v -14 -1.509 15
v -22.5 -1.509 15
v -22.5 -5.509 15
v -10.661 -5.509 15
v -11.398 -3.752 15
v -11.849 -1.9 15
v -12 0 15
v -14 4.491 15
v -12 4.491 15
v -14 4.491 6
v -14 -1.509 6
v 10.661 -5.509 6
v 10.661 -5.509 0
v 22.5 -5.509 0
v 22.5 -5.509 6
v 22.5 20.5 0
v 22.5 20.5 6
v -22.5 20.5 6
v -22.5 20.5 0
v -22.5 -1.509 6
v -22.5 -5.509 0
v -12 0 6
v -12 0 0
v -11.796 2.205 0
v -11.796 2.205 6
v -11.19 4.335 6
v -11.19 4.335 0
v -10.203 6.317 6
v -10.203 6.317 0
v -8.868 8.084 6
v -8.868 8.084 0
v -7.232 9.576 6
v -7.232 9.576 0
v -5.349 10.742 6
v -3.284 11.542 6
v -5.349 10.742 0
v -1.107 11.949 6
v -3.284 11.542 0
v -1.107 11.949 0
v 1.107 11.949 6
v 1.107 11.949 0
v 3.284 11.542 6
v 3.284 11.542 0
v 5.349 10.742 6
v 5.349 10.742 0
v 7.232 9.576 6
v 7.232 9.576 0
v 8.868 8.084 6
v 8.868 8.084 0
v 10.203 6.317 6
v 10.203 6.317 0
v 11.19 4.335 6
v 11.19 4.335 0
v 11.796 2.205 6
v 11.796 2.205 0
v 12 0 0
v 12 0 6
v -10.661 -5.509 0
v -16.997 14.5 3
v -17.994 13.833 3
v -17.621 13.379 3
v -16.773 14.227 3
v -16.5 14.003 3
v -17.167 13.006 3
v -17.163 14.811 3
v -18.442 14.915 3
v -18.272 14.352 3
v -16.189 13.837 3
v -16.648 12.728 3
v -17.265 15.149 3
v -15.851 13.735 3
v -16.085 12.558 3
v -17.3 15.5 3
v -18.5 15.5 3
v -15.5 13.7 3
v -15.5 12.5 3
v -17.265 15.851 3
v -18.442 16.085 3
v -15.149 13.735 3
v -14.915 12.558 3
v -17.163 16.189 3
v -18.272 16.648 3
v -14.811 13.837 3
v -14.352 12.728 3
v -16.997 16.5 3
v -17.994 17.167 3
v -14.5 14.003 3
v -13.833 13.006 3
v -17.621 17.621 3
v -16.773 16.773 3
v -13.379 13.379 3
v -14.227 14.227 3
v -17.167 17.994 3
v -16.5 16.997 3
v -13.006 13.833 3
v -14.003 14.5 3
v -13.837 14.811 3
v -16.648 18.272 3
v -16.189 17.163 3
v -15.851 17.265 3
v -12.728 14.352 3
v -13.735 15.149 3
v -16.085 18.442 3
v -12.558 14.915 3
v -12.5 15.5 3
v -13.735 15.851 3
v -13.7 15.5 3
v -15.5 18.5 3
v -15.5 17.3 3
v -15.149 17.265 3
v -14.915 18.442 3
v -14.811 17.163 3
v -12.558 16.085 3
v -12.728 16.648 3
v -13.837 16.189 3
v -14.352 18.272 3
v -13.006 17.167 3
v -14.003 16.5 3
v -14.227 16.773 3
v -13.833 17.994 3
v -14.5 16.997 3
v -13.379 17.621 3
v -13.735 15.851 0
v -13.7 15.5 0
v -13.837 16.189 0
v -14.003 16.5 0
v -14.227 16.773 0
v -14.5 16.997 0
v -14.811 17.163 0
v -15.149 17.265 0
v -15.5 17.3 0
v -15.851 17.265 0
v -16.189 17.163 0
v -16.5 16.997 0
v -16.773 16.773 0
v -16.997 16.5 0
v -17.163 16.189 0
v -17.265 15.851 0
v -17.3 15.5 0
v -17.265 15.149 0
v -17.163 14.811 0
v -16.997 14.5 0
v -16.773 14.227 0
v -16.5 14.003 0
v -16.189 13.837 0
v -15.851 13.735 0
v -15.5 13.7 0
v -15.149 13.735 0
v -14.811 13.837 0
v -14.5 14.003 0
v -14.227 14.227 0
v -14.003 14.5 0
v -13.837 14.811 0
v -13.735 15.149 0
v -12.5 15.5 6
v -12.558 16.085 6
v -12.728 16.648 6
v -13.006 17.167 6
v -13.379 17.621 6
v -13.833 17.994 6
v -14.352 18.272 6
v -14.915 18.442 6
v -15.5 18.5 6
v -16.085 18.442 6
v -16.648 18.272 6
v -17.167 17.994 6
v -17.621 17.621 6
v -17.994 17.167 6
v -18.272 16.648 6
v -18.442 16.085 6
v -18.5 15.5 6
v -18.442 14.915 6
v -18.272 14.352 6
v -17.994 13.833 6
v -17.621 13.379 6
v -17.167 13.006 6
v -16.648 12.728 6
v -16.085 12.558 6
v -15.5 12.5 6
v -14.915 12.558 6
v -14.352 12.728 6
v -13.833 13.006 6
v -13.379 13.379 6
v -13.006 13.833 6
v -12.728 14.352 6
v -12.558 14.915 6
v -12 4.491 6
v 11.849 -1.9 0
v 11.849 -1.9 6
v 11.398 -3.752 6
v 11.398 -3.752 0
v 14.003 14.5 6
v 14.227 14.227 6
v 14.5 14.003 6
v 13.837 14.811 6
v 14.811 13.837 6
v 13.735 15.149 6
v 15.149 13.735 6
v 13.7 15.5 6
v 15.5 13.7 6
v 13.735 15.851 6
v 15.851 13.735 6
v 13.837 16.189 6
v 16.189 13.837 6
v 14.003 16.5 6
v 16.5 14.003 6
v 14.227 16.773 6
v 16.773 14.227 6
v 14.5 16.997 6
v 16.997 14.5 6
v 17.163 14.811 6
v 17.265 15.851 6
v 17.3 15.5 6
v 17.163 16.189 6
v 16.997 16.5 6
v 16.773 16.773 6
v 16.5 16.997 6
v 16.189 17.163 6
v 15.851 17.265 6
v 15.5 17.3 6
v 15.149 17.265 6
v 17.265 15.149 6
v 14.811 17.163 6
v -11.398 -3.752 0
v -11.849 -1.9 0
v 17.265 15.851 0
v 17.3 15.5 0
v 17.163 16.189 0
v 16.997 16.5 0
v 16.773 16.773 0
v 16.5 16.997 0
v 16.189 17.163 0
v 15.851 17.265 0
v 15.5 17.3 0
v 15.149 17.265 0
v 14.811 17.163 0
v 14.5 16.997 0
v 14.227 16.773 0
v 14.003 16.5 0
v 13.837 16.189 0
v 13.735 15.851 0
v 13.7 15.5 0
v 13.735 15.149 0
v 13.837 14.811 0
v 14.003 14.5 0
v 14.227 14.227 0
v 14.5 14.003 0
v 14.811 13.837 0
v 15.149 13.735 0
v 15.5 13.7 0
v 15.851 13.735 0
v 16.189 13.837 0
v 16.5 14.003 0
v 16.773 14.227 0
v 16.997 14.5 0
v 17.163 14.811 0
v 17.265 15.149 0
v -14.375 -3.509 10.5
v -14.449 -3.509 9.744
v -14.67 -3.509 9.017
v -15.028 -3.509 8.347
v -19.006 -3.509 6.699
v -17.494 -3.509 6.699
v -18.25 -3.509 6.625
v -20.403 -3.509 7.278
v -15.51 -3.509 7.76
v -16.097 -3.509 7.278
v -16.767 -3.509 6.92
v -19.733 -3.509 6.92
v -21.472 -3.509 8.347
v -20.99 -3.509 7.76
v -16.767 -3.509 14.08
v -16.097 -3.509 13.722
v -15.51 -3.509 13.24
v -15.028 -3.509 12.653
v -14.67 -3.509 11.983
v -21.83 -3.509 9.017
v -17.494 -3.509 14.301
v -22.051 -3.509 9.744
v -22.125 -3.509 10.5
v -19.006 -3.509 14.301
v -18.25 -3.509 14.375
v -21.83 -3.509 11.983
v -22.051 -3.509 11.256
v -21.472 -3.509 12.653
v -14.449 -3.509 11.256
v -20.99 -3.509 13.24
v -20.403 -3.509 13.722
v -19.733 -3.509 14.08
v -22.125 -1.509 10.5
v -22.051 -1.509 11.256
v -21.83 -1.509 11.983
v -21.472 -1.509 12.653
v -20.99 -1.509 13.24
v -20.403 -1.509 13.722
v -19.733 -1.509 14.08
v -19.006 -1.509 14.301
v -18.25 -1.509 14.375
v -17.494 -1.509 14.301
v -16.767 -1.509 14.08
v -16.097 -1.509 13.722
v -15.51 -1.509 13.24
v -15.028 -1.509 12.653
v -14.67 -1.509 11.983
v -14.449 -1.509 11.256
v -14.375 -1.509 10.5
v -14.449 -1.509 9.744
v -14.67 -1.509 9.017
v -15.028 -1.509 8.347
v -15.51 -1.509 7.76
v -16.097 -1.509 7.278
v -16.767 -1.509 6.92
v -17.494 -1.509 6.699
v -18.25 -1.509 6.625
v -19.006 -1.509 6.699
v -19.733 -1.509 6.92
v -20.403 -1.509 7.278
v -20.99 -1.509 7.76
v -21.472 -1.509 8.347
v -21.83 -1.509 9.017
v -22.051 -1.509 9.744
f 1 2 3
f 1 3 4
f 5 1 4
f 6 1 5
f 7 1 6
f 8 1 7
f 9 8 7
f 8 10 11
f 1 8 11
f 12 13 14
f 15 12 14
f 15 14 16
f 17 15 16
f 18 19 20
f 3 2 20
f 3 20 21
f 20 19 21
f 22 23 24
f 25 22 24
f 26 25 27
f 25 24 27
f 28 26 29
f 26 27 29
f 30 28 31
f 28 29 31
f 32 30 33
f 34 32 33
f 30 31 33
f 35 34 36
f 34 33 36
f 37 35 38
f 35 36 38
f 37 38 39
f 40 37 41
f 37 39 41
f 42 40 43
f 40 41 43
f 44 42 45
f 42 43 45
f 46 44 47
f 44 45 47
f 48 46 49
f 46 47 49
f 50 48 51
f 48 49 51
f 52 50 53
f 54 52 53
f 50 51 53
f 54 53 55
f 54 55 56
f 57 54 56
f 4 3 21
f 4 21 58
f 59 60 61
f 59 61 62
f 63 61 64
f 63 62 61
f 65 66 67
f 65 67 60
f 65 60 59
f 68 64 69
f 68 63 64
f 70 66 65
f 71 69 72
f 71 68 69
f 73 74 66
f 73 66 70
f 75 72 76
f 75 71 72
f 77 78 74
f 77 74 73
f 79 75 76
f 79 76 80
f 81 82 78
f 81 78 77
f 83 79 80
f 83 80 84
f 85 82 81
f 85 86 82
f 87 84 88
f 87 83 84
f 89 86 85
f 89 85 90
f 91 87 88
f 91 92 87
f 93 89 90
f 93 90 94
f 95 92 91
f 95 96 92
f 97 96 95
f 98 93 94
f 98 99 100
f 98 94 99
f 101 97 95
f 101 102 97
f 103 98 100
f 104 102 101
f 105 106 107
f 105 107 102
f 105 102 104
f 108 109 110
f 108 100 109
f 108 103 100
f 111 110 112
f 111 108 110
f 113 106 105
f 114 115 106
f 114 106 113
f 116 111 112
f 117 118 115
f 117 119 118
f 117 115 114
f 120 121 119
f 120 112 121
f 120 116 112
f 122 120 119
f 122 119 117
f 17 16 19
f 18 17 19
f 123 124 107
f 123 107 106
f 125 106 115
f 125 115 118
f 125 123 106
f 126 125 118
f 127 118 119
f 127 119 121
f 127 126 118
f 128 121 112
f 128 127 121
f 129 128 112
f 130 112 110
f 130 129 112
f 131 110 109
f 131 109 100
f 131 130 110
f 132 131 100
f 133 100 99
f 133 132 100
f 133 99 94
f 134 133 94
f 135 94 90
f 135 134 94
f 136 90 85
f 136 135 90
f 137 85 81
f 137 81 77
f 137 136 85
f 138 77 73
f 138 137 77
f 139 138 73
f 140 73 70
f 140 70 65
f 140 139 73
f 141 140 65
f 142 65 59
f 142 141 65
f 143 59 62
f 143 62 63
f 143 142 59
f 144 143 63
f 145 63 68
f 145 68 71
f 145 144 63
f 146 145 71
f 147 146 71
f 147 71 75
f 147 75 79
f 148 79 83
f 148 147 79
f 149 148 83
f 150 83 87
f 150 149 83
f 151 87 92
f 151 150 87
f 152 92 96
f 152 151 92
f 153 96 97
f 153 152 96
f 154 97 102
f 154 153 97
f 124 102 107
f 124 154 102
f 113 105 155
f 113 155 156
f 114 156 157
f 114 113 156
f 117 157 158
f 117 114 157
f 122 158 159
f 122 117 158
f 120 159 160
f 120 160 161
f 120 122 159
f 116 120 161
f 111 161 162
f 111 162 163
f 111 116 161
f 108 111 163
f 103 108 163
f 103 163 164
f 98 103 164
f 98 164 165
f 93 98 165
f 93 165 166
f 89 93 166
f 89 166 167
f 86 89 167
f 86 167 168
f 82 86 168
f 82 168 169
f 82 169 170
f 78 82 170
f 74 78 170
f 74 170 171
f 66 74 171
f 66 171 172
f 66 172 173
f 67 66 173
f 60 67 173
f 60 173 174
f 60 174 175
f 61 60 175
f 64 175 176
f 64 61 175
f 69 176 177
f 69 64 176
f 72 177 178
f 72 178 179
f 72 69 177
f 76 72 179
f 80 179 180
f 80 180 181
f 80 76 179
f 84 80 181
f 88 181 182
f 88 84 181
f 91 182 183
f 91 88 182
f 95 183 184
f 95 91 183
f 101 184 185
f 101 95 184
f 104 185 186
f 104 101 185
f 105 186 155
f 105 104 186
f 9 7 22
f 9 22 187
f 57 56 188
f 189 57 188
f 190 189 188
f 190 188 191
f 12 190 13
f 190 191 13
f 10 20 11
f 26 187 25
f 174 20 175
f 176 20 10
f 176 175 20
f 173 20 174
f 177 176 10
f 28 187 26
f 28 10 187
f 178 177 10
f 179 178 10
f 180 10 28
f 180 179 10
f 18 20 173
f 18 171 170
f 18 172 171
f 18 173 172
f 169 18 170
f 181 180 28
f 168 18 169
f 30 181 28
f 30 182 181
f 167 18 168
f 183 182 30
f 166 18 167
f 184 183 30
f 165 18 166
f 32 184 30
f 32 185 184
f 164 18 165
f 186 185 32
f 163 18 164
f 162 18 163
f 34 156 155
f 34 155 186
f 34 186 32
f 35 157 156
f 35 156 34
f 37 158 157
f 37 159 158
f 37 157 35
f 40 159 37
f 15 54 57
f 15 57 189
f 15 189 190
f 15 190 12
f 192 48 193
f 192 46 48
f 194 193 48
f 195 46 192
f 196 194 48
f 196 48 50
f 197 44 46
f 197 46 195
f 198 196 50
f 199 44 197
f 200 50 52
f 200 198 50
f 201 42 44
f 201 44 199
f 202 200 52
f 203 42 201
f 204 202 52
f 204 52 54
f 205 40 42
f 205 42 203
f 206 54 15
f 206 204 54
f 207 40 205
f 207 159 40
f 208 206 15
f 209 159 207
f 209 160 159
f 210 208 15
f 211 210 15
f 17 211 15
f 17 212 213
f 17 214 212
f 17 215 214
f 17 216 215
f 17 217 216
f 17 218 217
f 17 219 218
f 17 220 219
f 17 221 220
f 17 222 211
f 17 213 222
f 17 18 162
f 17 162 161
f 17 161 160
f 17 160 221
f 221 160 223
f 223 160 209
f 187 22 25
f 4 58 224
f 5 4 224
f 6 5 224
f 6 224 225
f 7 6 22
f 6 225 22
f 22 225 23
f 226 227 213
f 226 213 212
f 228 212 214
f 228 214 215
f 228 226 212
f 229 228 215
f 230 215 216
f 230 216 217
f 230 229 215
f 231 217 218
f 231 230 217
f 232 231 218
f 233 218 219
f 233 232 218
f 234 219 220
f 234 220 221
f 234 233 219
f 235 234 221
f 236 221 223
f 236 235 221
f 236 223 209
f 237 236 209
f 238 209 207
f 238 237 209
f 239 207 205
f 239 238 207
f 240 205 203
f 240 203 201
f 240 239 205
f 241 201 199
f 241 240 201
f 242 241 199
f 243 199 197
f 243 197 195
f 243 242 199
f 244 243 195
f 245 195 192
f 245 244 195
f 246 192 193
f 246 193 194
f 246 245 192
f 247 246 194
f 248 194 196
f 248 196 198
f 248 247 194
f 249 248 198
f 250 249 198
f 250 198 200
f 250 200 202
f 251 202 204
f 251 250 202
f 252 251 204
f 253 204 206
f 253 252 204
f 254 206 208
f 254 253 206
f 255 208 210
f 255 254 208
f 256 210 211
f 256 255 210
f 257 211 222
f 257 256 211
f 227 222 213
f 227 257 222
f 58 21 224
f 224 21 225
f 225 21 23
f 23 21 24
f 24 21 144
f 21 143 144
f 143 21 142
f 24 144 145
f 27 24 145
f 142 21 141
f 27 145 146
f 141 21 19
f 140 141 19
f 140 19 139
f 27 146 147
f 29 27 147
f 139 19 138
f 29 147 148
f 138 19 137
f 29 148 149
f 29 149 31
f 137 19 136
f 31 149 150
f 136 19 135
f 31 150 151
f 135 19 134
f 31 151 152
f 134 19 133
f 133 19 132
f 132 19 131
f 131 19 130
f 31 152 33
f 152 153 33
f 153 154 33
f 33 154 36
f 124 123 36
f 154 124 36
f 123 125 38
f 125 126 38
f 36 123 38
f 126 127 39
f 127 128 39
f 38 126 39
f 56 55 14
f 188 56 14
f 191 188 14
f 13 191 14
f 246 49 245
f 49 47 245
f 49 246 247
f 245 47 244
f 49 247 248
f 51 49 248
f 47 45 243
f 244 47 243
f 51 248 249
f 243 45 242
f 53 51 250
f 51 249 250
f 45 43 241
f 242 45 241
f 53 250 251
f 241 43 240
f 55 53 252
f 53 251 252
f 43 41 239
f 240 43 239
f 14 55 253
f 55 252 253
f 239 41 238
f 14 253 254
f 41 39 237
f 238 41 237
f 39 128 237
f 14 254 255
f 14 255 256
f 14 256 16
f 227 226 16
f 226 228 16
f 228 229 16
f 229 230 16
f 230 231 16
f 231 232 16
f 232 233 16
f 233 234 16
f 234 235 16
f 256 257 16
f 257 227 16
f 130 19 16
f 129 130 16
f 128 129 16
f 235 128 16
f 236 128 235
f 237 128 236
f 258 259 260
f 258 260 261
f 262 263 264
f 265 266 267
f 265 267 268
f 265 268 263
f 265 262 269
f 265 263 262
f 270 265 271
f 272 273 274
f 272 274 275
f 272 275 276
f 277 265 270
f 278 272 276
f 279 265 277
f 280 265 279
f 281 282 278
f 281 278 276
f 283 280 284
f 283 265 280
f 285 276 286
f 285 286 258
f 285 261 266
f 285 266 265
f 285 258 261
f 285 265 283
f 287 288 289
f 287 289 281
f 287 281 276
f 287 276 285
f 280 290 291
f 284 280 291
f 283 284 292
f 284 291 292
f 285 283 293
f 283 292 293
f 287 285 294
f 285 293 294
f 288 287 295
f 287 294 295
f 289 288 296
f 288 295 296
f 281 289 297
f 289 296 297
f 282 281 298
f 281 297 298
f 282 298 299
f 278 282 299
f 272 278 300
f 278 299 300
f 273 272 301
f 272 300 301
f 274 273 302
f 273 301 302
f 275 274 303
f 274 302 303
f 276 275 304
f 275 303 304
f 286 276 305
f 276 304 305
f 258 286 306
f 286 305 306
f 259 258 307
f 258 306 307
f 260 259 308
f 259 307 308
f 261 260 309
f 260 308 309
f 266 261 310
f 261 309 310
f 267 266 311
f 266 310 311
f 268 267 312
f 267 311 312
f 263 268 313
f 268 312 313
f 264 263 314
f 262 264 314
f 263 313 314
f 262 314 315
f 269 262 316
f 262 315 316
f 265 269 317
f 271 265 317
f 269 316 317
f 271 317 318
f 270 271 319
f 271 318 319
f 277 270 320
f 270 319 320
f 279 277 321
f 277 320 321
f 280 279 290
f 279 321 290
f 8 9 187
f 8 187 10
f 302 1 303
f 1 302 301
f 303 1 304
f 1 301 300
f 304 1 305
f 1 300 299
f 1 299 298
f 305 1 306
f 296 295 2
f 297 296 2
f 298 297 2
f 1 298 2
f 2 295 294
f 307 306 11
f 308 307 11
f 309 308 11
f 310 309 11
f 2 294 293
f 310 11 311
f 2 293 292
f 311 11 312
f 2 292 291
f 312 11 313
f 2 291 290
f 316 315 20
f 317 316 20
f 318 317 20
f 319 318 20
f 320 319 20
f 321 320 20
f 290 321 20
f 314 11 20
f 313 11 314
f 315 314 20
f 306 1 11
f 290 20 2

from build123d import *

# Parameters (mm, degrees)
F0_R     = 3
F0_R_2   = 1.8
F1_DEPTH = 6
F2_DEPTH = 15
F3_DEPTH = 3
F4_R     = 3.875
F5_DEPTH = 2


with BuildPart() as f1:
    # F0 (on Top) → F1 (new body)
    with BuildSketch(Plane.XY):
        with BuildLine():
            Line((10.6606484084, -5.5091356412), (22.5, -5.5091356412))
            Line((22.5, -5.5091356412), (22.5, 20.5))
            Line((22.5, 20.5), (-22.5, 20.5))
            Line((-22.5, 20.5), (-22.5, -1.5091356412))
            Line((-22.5, -1.5091356412), (-14, -1.5091356412))
            Line((-14, -1.5091356412), (-14, 4.4908643588))
            Line((-14, 4.4908643588), (-12, 4.4908643588))
            Line((-12, 4.4908643588), (-12, 0))
            ThreePointArc((-12, 0), (0, 12), (12, 0))
            ThreePointArc((12, 0), (11.6603555027, -2.8348032647), (10.6606484084, -5.5091356412))
        make_face()
        with Locations((-15.5, 15.5)):
            Circle(F0_R, mode=Mode.SUBTRACT)
        with Locations((15.5, 15.5)):
            Circle(F0_R, mode=Mode.SUBTRACT)
        Polygon((-14, -1.5091356412), (-22.5, -1.5091356412), (-22.5, -5.5091356412), (-12, -5.5091356412), (-12, 0), (-12, 4.4908643588), (-14, 4.4908643588), align=None)
        with Locations((15.5, 15.5)):
            Circle(F0_R)
        with Locations((15.5, 15.5)):
            Circle(F0_R_2, mode=Mode.SUBTRACT)
    extrude(amount=F1_DEPTH)

    # F0 (on Top) → F2 (join)
    with BuildSketch(Plane.XY):
        Polygon((-14, -1.5091356412), (-22.5, -1.5091356412), (-22.5, -5.5091356412), (-12, -5.5091356412), (-12, 0), (-12, 4.4908643588), (-14, 4.4908643588), align=None)
        with BuildLine():
            Line((-12, -5.5091356412), (-10.6606484084, -5.5091356412))
            ThreePointArc((-10.6606484084, -5.5091356412), (-11.6603555027, -2.8348032647), (-12, 0))
            Line((-12, 0), (-12, -5.5091356412))
        make_face()
    extrude(amount=F2_DEPTH)

    # F0 (on Top) → F3 (join)
    with BuildSketch(Plane.XY):
        with Locations((-15.5, 15.5)):
            Circle(F0_R)
        with Locations((-15.5, 15.5)):
            Circle(F0_R_2, mode=Mode.SUBTRACT)
    extrude(amount=F3_DEPTH)

    # F4 (on face) → F5 (cut)
    with BuildSketch(Plane(origin=(0, -1.5091356412, 0), x_dir=(-1, 0, 0), z_dir=(0, 1, 0))):
        with Locations((18.25, 10.5)):
            Circle(F4_R)
    extrude(amount=-F5_DEPTH, mode=Mode.SUBTRACT)


solid = f1.part
